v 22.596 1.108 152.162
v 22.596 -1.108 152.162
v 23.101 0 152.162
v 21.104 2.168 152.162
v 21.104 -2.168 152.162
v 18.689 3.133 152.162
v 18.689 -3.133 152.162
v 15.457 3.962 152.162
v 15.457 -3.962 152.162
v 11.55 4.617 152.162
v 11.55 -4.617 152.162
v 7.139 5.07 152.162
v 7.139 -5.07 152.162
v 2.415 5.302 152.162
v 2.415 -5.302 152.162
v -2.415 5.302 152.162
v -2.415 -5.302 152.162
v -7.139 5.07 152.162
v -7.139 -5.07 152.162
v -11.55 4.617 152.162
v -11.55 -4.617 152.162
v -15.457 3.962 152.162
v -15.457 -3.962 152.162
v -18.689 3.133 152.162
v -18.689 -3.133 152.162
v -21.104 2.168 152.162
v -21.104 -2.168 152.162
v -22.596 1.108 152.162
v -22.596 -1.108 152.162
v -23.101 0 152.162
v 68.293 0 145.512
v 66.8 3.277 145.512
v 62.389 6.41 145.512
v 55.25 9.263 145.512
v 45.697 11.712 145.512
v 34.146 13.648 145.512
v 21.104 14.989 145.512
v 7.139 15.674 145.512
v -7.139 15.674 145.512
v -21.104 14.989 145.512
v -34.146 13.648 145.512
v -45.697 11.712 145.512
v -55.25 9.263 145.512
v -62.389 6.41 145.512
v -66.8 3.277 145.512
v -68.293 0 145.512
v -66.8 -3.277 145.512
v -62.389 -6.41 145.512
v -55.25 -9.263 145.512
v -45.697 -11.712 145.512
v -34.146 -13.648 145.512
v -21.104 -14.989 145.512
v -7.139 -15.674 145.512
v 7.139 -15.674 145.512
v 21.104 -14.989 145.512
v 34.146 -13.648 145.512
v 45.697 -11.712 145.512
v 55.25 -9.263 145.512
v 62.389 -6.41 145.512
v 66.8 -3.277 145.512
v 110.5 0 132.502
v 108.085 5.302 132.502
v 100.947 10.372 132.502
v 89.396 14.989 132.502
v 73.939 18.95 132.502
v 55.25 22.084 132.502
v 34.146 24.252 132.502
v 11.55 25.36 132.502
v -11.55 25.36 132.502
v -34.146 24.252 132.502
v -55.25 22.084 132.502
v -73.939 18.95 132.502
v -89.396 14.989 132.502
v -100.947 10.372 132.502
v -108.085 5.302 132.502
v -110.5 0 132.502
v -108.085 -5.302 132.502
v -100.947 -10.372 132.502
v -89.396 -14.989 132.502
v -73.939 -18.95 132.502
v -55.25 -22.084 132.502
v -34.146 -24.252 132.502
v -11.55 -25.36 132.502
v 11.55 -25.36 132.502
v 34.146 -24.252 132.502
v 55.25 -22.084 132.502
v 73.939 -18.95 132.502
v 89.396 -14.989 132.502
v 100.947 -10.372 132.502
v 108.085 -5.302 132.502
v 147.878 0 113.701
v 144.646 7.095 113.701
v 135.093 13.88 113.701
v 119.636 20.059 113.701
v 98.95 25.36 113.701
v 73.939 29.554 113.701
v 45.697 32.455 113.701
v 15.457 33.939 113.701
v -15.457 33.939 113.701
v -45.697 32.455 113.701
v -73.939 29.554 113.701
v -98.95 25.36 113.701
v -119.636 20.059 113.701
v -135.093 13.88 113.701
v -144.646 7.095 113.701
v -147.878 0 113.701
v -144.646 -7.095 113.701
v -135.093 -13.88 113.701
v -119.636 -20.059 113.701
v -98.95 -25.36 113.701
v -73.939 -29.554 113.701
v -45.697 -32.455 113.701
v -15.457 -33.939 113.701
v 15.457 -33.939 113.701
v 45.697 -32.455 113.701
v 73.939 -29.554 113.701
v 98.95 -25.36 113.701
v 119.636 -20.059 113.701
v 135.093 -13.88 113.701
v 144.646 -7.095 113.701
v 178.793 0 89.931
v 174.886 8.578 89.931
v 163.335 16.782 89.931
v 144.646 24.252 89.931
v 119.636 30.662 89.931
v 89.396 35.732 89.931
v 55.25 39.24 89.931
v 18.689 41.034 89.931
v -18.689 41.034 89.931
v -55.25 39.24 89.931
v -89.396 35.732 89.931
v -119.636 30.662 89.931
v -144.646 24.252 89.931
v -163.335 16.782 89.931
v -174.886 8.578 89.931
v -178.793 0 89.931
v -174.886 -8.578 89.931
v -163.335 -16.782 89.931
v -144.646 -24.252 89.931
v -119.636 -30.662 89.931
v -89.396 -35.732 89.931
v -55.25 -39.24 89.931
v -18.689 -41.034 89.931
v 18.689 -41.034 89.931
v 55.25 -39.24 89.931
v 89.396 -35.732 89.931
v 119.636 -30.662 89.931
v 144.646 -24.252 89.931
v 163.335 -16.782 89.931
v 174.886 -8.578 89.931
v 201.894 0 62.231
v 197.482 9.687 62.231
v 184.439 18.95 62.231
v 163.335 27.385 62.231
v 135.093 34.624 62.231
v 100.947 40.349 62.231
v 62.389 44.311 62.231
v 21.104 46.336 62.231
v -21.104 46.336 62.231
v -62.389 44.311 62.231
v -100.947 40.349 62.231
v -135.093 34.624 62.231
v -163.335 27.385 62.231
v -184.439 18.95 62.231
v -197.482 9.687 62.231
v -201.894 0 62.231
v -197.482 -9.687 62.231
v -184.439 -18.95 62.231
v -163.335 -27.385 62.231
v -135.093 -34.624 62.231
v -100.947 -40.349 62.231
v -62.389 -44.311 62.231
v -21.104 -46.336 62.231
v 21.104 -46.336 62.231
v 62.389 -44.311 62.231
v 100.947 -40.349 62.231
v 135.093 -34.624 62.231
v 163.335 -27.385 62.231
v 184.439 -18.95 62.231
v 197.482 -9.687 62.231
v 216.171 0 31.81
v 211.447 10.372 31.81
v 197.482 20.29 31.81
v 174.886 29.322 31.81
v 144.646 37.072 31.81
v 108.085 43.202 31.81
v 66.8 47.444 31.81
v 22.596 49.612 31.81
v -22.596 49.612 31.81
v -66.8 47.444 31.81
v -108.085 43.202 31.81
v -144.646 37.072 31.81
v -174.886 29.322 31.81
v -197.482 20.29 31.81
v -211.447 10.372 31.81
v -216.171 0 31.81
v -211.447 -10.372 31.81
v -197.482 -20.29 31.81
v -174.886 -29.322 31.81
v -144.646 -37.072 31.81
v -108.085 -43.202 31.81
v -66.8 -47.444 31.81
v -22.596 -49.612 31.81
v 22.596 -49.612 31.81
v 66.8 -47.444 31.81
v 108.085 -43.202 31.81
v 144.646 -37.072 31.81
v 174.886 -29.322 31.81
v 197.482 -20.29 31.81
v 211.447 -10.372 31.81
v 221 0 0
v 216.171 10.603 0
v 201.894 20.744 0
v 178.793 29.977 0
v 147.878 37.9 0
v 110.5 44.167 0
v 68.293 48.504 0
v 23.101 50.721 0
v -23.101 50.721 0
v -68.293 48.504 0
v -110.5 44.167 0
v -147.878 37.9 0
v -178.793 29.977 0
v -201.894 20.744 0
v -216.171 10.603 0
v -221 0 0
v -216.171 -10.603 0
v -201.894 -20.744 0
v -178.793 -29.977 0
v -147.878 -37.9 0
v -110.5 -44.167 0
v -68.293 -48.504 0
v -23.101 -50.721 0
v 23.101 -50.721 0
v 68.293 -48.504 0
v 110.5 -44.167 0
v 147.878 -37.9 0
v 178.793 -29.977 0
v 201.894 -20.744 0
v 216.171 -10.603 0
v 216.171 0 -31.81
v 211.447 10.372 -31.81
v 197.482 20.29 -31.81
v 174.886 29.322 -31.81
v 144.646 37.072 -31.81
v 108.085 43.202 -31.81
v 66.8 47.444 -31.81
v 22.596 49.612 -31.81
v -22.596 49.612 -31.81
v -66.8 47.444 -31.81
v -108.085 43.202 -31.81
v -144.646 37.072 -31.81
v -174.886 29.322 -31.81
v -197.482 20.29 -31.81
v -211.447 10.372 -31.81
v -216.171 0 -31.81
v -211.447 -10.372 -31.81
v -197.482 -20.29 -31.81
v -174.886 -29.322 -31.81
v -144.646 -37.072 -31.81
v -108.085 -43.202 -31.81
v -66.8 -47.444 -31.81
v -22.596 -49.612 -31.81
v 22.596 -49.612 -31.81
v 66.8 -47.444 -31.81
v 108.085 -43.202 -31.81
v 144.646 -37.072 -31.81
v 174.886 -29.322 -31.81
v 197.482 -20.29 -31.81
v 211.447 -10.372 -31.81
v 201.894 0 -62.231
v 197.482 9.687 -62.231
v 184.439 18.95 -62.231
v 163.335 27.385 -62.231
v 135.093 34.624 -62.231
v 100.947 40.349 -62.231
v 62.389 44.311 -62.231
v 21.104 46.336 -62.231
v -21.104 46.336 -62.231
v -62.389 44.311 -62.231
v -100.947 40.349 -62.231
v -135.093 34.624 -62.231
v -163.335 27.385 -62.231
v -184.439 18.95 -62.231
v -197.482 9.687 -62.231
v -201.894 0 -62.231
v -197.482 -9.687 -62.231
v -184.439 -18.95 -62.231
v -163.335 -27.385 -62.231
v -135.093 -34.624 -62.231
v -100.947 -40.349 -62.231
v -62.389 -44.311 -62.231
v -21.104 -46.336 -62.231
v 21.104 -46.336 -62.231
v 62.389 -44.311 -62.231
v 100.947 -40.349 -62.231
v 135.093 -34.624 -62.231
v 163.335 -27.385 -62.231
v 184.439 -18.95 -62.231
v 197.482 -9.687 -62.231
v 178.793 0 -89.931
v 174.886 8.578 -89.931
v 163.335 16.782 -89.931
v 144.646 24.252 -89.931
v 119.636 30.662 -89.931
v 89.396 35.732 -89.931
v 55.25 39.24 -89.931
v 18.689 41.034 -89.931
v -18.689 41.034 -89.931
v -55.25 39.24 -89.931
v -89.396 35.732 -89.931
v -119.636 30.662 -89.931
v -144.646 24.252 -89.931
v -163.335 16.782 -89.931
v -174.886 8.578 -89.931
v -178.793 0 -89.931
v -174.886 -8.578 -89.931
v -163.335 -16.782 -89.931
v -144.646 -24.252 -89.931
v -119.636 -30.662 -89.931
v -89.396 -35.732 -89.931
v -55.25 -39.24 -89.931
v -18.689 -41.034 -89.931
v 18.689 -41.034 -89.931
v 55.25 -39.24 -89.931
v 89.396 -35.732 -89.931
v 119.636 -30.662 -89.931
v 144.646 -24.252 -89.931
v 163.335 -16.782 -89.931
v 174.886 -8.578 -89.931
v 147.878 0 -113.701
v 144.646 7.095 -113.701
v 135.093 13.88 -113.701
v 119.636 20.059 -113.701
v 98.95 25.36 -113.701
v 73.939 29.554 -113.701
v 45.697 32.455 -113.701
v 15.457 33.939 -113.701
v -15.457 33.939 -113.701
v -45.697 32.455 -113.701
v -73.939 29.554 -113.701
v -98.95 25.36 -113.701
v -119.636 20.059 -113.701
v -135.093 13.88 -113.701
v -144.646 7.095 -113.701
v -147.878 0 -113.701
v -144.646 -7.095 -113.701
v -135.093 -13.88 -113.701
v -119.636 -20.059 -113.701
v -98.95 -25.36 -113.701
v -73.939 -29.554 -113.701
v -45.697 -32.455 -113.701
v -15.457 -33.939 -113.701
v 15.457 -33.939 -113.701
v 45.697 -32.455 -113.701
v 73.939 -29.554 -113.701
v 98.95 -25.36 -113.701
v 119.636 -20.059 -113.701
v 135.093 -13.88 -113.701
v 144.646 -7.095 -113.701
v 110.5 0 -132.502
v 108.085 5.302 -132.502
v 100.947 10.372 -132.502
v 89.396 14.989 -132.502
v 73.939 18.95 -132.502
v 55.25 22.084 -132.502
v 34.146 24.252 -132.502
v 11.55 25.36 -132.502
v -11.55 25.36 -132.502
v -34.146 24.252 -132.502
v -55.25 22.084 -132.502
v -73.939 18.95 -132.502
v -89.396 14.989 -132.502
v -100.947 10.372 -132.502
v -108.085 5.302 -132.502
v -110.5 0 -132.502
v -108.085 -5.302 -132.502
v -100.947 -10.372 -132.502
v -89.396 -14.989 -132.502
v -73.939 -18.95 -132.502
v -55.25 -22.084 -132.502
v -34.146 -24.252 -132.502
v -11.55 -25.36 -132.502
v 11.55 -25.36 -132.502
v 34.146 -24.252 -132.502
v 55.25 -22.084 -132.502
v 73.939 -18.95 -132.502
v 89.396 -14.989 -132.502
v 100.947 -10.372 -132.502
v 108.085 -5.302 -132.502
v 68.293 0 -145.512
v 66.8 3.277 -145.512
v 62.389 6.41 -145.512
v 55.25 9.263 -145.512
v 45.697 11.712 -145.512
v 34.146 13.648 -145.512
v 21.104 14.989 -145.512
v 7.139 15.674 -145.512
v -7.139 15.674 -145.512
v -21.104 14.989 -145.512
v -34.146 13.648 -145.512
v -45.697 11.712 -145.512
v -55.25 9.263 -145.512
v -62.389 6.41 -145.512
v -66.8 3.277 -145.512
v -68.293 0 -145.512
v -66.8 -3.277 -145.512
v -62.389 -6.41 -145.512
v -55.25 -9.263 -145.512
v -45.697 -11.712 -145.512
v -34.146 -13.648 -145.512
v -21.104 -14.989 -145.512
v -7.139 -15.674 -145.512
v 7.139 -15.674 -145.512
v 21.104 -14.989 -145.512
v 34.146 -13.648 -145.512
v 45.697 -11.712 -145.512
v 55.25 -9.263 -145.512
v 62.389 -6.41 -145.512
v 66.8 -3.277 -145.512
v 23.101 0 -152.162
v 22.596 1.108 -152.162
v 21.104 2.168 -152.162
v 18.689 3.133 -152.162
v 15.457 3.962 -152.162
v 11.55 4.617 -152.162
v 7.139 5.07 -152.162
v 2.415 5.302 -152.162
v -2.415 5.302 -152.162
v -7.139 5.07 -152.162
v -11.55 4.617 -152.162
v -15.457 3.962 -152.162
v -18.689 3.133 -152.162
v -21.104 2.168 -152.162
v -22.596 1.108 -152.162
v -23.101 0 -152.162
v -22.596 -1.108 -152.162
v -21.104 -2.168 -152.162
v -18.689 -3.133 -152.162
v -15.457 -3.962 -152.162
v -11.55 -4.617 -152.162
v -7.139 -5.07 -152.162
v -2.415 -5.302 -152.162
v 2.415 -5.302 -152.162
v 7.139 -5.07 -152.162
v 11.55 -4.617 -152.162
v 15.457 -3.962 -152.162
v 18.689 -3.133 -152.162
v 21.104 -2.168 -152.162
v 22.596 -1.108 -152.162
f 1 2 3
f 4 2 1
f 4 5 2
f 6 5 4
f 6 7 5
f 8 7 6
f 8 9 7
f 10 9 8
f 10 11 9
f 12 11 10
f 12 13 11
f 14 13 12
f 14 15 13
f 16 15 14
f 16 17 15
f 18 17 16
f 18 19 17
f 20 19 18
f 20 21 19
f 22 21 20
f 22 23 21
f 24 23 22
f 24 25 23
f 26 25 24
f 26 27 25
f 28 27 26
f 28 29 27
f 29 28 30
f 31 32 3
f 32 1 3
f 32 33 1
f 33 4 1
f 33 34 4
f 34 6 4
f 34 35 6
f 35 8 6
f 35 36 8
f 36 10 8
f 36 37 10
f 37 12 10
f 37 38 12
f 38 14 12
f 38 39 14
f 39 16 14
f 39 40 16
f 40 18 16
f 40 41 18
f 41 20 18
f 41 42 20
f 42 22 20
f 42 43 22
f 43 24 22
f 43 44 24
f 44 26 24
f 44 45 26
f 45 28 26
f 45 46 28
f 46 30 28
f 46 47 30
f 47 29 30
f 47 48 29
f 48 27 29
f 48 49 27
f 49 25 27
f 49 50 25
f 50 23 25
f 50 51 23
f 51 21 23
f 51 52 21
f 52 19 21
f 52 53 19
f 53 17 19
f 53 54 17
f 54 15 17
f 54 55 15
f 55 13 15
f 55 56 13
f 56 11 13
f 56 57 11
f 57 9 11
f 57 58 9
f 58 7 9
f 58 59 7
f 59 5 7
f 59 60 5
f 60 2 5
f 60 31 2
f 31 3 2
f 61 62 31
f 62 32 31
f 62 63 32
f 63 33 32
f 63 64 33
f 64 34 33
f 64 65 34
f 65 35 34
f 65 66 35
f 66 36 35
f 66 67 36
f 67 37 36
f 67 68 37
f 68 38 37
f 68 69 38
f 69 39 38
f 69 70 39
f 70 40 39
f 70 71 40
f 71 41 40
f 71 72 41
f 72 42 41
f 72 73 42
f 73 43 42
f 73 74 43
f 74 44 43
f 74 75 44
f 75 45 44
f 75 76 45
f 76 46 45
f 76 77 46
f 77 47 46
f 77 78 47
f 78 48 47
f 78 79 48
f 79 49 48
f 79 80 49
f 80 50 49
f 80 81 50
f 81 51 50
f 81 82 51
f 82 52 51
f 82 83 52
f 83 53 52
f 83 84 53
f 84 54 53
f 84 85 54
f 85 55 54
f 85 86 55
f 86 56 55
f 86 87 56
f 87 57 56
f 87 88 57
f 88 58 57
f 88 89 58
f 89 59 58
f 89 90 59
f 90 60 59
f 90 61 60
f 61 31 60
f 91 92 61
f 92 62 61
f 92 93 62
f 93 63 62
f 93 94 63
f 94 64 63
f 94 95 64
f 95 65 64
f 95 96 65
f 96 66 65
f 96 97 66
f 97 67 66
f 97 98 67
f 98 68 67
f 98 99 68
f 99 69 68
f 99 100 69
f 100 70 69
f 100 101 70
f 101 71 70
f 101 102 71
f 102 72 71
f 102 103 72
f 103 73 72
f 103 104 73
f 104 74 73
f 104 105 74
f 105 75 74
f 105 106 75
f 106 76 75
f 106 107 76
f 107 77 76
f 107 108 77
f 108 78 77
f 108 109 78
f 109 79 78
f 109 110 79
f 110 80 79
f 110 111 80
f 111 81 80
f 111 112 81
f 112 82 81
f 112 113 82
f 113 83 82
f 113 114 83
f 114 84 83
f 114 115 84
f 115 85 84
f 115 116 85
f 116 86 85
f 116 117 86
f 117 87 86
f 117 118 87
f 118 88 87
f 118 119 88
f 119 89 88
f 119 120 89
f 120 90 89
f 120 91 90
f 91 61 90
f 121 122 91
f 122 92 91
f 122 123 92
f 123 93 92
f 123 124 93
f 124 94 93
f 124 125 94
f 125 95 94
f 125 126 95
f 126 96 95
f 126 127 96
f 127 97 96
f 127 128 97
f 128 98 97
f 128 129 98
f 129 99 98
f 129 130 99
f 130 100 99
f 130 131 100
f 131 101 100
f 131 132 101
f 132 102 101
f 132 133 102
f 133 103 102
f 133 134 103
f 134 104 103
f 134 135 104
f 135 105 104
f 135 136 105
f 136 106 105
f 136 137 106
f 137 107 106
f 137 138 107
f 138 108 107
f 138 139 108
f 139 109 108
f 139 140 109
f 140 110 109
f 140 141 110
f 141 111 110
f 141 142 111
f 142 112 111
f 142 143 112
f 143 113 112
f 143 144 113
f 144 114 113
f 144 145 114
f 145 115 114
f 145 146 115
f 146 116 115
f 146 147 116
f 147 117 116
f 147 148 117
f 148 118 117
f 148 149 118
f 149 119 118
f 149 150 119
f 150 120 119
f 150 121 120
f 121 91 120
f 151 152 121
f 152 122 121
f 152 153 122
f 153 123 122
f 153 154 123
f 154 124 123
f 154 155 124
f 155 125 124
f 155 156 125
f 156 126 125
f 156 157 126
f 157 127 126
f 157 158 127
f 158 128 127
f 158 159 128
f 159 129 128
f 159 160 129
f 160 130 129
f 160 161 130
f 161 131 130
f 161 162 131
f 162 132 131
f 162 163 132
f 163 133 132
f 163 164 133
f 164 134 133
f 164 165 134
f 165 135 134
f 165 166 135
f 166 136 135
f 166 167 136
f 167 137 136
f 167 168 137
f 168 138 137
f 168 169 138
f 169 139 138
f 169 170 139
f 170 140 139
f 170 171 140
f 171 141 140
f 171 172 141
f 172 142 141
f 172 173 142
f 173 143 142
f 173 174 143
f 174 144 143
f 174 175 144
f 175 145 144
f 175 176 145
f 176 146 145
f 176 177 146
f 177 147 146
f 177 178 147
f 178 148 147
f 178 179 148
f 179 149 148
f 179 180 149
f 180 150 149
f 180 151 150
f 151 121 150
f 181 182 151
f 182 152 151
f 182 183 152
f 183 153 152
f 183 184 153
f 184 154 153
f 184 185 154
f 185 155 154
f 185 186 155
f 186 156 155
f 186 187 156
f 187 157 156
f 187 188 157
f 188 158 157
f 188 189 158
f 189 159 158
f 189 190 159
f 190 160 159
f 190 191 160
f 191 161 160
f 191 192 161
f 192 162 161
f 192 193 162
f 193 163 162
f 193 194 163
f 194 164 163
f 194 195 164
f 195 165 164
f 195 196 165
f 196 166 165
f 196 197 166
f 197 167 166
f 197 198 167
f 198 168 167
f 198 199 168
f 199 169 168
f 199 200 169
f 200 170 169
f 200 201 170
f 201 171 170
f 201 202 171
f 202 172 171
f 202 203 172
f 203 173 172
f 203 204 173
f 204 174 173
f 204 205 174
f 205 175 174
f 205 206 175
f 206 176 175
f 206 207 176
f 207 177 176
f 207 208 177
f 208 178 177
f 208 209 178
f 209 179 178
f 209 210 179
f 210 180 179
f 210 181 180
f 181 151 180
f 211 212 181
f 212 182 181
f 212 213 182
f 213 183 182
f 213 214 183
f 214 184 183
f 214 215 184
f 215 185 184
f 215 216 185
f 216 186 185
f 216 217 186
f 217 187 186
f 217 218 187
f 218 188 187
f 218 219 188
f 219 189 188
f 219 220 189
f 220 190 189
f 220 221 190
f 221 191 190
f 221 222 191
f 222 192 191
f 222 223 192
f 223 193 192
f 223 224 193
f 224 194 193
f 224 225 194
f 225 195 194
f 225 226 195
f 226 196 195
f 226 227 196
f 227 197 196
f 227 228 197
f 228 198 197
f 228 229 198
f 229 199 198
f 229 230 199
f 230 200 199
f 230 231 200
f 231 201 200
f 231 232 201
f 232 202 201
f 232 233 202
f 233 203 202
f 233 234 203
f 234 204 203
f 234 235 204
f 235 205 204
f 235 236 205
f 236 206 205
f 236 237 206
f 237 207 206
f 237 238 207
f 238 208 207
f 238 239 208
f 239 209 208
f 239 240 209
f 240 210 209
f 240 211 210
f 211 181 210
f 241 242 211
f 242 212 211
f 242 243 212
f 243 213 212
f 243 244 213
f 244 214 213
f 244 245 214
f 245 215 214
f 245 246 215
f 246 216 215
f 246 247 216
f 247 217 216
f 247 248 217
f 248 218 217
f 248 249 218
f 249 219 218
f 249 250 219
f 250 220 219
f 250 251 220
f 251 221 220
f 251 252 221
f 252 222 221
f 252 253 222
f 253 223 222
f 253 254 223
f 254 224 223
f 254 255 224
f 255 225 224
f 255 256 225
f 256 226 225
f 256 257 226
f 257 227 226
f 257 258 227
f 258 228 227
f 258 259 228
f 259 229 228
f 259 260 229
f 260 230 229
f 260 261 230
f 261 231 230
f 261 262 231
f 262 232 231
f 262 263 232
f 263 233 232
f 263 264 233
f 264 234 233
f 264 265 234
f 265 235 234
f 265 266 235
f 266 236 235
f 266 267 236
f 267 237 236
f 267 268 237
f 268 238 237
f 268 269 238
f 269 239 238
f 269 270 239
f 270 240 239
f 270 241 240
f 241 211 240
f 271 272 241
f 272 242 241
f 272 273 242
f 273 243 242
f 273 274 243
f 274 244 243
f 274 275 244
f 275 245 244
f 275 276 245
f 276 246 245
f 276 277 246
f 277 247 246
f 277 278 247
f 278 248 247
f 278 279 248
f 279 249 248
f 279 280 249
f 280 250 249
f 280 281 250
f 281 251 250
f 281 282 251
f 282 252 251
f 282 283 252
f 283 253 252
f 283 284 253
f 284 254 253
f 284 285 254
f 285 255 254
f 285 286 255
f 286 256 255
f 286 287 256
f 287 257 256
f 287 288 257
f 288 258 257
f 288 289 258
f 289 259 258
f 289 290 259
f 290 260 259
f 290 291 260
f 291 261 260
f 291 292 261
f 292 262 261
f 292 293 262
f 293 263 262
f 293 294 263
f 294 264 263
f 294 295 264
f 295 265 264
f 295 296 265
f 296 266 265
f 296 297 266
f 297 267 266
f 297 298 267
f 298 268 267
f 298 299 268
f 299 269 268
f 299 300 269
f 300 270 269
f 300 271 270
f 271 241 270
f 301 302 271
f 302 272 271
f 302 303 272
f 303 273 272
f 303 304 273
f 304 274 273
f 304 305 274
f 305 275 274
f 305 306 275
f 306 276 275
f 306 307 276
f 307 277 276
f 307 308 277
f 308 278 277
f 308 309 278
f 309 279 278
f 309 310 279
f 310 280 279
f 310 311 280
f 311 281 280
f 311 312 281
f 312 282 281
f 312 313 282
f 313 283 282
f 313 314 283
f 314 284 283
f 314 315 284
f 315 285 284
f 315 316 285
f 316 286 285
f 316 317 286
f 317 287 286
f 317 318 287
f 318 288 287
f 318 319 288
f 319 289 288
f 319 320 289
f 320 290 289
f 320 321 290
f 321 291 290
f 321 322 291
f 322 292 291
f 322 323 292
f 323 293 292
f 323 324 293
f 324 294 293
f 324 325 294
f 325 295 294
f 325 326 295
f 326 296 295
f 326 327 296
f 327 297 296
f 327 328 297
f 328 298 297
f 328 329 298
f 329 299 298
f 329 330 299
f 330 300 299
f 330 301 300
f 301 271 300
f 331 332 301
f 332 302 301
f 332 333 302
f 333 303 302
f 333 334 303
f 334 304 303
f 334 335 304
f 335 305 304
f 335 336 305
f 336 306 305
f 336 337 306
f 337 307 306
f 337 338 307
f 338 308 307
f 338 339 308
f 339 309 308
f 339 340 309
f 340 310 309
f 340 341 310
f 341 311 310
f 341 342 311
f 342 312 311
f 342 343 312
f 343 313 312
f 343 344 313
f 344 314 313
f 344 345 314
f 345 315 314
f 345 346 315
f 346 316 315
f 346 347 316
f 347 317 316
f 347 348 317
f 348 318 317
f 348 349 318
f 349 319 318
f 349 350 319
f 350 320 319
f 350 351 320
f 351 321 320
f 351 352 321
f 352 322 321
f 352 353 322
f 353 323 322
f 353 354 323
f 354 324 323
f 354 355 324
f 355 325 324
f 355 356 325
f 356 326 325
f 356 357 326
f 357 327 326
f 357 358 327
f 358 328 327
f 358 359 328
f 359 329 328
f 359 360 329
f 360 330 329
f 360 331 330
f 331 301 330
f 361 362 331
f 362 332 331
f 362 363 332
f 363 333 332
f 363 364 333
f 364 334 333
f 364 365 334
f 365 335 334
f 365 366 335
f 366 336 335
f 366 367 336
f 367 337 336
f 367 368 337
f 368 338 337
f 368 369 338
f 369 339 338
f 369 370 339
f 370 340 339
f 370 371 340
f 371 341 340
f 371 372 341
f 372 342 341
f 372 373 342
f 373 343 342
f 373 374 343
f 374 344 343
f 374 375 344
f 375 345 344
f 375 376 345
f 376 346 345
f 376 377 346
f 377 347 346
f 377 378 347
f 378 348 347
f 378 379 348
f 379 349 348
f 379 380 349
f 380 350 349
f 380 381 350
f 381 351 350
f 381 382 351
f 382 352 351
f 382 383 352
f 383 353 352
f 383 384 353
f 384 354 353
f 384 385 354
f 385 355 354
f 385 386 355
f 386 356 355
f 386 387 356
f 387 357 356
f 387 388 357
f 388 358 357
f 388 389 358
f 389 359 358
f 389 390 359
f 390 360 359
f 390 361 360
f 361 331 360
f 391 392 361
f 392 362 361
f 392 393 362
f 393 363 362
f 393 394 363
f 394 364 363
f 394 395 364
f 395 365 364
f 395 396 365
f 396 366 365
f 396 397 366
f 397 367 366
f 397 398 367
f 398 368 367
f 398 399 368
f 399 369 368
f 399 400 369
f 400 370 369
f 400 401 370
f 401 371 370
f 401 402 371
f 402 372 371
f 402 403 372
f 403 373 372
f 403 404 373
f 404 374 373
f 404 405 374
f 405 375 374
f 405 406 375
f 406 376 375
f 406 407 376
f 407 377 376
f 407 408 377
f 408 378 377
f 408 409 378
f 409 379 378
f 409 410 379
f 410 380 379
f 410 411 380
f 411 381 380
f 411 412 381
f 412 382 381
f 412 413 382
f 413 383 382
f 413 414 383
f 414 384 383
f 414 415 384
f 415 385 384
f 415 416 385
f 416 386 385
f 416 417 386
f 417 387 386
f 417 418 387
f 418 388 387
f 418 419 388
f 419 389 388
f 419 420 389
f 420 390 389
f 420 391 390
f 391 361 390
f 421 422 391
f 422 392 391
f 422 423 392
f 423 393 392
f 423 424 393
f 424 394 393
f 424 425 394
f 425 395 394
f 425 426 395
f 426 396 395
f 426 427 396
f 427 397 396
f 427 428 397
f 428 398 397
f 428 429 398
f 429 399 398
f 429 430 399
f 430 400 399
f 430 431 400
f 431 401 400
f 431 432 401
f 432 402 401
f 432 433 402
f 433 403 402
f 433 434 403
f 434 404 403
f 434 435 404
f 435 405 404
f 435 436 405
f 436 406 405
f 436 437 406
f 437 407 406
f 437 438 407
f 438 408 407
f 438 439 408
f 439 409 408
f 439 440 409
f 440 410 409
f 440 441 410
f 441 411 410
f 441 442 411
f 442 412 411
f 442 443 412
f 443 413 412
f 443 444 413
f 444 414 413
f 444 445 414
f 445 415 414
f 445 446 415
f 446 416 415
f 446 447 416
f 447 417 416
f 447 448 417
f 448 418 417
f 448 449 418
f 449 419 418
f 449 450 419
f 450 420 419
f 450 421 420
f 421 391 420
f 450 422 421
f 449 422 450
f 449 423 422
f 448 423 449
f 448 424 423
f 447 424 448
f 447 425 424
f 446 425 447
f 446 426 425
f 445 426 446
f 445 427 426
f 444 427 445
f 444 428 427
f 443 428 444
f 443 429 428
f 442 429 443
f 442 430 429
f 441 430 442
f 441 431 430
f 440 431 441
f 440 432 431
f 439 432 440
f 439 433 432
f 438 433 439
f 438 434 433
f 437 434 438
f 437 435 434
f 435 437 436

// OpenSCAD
// Generated by SolidPython 1.0.1 on 2020-07-29 00:46:50


scale(v = [13, 3, 9]) {
	sphere(r = 17);
}
/***********************************************
*********      SolidPython code:      **********
************************************************
 
# import packages: SolidPython
from solid import *
from solid.utils import *
from itertools import chain, combinations, permutations


class Resize:

    def __init__(self, scad_file):
        self.scad_file = scad_file
        #self.scad_file = import_scad(scad_file)
        # cone/cylinder param:
        self.r1 = 0
        self.r2 = 0
        self.h = 0
        # rectangular prism param:
        self.w = 0
        self.l = 0
        # ellipse param:
        self.r = 0

    # import OpenScad code (file name corresponds to shape)


    # classify shape + parameters
    def assign(self, param1, param2, param3):
        if self.scad_file == 'cone.scad':
            self.r1 = param1
            self.r2 = param2
            self.h = param3
        elif self.scad_file == 'cylinder.scad':
            self.r1 = param1
            self.r2 = param2
            self.h = param3
        elif self.scad_file == 'rectangularPrism.scad':
            self.h = param1
            self.l = param2
            self.w = param3
        else:
            self.r = param1
            self.h = param2

    # resize parameters
    def iterate(self):
        x = range(3, 20, 2)
        i = 1
        if self.scad_file == 'cone.scad':
            tempList = list(permutations(x, 2))
            for temp in tempList:
                param1 = temp[0]
                param2 = temp[1]
                filepath = 'produced_scad_files/' + 'cone' + str(param1) + '_' + str(param2) + '_' + '.scad'
                scad_render_to_file(cylinder(h=param1, r1=param2, r2=0), filepath)

        elif self.scad_file == 'cylinder.scad':
            tempList = list(permutations(x, 3))
            for temp in tempList:
                param1 = temp[0]
                param2 = temp[1]
                filepath = 'produced_scad_files/' + 'cylinder' + str(param1) + '_' + str(param2) + '_' + '.scad'
                scad_render_to_file(cylinder(h=param1, r1=param2, r2=param2), filepath)

        elif self.scad_file == 'rectangularPrism.scad':
            tempList = list(permutations(x, 3))
            for temp in tempList:
                param1 = temp[0]
                param2 = temp[1]
                param3 = temp[2]
                filepath = 'produced_scad_files/' + 'rectangularPrism' + str(param1) + '_' + str(param2) + '_' + str(
                    param3) + '.scad'
                scad_render_to_file(cube(size=(param1, param2, param3)), filepath)

        elif self.scad_file == 'ellipse.scad':
            tempList = list(permutations(x, 4))
            for temp in tempList:
                param1 = temp[0]
                param2 = temp[1]
                param3 = temp[2]
                param4 = temp[3]
                filepath = 'produced_scad_files/' + 'ellipse' + str(param1) + '_' + str(param2) + '_' + str(param3) + '_' + str(param4) + '.scad'
                scad_render_to_file(scale([param1, param2, param3])(sphere(r=param4)), filepath)

    def render_to_scadfile(self):
        scad_render_to_file(scad, 'example.scad') 
 
************************************************/
